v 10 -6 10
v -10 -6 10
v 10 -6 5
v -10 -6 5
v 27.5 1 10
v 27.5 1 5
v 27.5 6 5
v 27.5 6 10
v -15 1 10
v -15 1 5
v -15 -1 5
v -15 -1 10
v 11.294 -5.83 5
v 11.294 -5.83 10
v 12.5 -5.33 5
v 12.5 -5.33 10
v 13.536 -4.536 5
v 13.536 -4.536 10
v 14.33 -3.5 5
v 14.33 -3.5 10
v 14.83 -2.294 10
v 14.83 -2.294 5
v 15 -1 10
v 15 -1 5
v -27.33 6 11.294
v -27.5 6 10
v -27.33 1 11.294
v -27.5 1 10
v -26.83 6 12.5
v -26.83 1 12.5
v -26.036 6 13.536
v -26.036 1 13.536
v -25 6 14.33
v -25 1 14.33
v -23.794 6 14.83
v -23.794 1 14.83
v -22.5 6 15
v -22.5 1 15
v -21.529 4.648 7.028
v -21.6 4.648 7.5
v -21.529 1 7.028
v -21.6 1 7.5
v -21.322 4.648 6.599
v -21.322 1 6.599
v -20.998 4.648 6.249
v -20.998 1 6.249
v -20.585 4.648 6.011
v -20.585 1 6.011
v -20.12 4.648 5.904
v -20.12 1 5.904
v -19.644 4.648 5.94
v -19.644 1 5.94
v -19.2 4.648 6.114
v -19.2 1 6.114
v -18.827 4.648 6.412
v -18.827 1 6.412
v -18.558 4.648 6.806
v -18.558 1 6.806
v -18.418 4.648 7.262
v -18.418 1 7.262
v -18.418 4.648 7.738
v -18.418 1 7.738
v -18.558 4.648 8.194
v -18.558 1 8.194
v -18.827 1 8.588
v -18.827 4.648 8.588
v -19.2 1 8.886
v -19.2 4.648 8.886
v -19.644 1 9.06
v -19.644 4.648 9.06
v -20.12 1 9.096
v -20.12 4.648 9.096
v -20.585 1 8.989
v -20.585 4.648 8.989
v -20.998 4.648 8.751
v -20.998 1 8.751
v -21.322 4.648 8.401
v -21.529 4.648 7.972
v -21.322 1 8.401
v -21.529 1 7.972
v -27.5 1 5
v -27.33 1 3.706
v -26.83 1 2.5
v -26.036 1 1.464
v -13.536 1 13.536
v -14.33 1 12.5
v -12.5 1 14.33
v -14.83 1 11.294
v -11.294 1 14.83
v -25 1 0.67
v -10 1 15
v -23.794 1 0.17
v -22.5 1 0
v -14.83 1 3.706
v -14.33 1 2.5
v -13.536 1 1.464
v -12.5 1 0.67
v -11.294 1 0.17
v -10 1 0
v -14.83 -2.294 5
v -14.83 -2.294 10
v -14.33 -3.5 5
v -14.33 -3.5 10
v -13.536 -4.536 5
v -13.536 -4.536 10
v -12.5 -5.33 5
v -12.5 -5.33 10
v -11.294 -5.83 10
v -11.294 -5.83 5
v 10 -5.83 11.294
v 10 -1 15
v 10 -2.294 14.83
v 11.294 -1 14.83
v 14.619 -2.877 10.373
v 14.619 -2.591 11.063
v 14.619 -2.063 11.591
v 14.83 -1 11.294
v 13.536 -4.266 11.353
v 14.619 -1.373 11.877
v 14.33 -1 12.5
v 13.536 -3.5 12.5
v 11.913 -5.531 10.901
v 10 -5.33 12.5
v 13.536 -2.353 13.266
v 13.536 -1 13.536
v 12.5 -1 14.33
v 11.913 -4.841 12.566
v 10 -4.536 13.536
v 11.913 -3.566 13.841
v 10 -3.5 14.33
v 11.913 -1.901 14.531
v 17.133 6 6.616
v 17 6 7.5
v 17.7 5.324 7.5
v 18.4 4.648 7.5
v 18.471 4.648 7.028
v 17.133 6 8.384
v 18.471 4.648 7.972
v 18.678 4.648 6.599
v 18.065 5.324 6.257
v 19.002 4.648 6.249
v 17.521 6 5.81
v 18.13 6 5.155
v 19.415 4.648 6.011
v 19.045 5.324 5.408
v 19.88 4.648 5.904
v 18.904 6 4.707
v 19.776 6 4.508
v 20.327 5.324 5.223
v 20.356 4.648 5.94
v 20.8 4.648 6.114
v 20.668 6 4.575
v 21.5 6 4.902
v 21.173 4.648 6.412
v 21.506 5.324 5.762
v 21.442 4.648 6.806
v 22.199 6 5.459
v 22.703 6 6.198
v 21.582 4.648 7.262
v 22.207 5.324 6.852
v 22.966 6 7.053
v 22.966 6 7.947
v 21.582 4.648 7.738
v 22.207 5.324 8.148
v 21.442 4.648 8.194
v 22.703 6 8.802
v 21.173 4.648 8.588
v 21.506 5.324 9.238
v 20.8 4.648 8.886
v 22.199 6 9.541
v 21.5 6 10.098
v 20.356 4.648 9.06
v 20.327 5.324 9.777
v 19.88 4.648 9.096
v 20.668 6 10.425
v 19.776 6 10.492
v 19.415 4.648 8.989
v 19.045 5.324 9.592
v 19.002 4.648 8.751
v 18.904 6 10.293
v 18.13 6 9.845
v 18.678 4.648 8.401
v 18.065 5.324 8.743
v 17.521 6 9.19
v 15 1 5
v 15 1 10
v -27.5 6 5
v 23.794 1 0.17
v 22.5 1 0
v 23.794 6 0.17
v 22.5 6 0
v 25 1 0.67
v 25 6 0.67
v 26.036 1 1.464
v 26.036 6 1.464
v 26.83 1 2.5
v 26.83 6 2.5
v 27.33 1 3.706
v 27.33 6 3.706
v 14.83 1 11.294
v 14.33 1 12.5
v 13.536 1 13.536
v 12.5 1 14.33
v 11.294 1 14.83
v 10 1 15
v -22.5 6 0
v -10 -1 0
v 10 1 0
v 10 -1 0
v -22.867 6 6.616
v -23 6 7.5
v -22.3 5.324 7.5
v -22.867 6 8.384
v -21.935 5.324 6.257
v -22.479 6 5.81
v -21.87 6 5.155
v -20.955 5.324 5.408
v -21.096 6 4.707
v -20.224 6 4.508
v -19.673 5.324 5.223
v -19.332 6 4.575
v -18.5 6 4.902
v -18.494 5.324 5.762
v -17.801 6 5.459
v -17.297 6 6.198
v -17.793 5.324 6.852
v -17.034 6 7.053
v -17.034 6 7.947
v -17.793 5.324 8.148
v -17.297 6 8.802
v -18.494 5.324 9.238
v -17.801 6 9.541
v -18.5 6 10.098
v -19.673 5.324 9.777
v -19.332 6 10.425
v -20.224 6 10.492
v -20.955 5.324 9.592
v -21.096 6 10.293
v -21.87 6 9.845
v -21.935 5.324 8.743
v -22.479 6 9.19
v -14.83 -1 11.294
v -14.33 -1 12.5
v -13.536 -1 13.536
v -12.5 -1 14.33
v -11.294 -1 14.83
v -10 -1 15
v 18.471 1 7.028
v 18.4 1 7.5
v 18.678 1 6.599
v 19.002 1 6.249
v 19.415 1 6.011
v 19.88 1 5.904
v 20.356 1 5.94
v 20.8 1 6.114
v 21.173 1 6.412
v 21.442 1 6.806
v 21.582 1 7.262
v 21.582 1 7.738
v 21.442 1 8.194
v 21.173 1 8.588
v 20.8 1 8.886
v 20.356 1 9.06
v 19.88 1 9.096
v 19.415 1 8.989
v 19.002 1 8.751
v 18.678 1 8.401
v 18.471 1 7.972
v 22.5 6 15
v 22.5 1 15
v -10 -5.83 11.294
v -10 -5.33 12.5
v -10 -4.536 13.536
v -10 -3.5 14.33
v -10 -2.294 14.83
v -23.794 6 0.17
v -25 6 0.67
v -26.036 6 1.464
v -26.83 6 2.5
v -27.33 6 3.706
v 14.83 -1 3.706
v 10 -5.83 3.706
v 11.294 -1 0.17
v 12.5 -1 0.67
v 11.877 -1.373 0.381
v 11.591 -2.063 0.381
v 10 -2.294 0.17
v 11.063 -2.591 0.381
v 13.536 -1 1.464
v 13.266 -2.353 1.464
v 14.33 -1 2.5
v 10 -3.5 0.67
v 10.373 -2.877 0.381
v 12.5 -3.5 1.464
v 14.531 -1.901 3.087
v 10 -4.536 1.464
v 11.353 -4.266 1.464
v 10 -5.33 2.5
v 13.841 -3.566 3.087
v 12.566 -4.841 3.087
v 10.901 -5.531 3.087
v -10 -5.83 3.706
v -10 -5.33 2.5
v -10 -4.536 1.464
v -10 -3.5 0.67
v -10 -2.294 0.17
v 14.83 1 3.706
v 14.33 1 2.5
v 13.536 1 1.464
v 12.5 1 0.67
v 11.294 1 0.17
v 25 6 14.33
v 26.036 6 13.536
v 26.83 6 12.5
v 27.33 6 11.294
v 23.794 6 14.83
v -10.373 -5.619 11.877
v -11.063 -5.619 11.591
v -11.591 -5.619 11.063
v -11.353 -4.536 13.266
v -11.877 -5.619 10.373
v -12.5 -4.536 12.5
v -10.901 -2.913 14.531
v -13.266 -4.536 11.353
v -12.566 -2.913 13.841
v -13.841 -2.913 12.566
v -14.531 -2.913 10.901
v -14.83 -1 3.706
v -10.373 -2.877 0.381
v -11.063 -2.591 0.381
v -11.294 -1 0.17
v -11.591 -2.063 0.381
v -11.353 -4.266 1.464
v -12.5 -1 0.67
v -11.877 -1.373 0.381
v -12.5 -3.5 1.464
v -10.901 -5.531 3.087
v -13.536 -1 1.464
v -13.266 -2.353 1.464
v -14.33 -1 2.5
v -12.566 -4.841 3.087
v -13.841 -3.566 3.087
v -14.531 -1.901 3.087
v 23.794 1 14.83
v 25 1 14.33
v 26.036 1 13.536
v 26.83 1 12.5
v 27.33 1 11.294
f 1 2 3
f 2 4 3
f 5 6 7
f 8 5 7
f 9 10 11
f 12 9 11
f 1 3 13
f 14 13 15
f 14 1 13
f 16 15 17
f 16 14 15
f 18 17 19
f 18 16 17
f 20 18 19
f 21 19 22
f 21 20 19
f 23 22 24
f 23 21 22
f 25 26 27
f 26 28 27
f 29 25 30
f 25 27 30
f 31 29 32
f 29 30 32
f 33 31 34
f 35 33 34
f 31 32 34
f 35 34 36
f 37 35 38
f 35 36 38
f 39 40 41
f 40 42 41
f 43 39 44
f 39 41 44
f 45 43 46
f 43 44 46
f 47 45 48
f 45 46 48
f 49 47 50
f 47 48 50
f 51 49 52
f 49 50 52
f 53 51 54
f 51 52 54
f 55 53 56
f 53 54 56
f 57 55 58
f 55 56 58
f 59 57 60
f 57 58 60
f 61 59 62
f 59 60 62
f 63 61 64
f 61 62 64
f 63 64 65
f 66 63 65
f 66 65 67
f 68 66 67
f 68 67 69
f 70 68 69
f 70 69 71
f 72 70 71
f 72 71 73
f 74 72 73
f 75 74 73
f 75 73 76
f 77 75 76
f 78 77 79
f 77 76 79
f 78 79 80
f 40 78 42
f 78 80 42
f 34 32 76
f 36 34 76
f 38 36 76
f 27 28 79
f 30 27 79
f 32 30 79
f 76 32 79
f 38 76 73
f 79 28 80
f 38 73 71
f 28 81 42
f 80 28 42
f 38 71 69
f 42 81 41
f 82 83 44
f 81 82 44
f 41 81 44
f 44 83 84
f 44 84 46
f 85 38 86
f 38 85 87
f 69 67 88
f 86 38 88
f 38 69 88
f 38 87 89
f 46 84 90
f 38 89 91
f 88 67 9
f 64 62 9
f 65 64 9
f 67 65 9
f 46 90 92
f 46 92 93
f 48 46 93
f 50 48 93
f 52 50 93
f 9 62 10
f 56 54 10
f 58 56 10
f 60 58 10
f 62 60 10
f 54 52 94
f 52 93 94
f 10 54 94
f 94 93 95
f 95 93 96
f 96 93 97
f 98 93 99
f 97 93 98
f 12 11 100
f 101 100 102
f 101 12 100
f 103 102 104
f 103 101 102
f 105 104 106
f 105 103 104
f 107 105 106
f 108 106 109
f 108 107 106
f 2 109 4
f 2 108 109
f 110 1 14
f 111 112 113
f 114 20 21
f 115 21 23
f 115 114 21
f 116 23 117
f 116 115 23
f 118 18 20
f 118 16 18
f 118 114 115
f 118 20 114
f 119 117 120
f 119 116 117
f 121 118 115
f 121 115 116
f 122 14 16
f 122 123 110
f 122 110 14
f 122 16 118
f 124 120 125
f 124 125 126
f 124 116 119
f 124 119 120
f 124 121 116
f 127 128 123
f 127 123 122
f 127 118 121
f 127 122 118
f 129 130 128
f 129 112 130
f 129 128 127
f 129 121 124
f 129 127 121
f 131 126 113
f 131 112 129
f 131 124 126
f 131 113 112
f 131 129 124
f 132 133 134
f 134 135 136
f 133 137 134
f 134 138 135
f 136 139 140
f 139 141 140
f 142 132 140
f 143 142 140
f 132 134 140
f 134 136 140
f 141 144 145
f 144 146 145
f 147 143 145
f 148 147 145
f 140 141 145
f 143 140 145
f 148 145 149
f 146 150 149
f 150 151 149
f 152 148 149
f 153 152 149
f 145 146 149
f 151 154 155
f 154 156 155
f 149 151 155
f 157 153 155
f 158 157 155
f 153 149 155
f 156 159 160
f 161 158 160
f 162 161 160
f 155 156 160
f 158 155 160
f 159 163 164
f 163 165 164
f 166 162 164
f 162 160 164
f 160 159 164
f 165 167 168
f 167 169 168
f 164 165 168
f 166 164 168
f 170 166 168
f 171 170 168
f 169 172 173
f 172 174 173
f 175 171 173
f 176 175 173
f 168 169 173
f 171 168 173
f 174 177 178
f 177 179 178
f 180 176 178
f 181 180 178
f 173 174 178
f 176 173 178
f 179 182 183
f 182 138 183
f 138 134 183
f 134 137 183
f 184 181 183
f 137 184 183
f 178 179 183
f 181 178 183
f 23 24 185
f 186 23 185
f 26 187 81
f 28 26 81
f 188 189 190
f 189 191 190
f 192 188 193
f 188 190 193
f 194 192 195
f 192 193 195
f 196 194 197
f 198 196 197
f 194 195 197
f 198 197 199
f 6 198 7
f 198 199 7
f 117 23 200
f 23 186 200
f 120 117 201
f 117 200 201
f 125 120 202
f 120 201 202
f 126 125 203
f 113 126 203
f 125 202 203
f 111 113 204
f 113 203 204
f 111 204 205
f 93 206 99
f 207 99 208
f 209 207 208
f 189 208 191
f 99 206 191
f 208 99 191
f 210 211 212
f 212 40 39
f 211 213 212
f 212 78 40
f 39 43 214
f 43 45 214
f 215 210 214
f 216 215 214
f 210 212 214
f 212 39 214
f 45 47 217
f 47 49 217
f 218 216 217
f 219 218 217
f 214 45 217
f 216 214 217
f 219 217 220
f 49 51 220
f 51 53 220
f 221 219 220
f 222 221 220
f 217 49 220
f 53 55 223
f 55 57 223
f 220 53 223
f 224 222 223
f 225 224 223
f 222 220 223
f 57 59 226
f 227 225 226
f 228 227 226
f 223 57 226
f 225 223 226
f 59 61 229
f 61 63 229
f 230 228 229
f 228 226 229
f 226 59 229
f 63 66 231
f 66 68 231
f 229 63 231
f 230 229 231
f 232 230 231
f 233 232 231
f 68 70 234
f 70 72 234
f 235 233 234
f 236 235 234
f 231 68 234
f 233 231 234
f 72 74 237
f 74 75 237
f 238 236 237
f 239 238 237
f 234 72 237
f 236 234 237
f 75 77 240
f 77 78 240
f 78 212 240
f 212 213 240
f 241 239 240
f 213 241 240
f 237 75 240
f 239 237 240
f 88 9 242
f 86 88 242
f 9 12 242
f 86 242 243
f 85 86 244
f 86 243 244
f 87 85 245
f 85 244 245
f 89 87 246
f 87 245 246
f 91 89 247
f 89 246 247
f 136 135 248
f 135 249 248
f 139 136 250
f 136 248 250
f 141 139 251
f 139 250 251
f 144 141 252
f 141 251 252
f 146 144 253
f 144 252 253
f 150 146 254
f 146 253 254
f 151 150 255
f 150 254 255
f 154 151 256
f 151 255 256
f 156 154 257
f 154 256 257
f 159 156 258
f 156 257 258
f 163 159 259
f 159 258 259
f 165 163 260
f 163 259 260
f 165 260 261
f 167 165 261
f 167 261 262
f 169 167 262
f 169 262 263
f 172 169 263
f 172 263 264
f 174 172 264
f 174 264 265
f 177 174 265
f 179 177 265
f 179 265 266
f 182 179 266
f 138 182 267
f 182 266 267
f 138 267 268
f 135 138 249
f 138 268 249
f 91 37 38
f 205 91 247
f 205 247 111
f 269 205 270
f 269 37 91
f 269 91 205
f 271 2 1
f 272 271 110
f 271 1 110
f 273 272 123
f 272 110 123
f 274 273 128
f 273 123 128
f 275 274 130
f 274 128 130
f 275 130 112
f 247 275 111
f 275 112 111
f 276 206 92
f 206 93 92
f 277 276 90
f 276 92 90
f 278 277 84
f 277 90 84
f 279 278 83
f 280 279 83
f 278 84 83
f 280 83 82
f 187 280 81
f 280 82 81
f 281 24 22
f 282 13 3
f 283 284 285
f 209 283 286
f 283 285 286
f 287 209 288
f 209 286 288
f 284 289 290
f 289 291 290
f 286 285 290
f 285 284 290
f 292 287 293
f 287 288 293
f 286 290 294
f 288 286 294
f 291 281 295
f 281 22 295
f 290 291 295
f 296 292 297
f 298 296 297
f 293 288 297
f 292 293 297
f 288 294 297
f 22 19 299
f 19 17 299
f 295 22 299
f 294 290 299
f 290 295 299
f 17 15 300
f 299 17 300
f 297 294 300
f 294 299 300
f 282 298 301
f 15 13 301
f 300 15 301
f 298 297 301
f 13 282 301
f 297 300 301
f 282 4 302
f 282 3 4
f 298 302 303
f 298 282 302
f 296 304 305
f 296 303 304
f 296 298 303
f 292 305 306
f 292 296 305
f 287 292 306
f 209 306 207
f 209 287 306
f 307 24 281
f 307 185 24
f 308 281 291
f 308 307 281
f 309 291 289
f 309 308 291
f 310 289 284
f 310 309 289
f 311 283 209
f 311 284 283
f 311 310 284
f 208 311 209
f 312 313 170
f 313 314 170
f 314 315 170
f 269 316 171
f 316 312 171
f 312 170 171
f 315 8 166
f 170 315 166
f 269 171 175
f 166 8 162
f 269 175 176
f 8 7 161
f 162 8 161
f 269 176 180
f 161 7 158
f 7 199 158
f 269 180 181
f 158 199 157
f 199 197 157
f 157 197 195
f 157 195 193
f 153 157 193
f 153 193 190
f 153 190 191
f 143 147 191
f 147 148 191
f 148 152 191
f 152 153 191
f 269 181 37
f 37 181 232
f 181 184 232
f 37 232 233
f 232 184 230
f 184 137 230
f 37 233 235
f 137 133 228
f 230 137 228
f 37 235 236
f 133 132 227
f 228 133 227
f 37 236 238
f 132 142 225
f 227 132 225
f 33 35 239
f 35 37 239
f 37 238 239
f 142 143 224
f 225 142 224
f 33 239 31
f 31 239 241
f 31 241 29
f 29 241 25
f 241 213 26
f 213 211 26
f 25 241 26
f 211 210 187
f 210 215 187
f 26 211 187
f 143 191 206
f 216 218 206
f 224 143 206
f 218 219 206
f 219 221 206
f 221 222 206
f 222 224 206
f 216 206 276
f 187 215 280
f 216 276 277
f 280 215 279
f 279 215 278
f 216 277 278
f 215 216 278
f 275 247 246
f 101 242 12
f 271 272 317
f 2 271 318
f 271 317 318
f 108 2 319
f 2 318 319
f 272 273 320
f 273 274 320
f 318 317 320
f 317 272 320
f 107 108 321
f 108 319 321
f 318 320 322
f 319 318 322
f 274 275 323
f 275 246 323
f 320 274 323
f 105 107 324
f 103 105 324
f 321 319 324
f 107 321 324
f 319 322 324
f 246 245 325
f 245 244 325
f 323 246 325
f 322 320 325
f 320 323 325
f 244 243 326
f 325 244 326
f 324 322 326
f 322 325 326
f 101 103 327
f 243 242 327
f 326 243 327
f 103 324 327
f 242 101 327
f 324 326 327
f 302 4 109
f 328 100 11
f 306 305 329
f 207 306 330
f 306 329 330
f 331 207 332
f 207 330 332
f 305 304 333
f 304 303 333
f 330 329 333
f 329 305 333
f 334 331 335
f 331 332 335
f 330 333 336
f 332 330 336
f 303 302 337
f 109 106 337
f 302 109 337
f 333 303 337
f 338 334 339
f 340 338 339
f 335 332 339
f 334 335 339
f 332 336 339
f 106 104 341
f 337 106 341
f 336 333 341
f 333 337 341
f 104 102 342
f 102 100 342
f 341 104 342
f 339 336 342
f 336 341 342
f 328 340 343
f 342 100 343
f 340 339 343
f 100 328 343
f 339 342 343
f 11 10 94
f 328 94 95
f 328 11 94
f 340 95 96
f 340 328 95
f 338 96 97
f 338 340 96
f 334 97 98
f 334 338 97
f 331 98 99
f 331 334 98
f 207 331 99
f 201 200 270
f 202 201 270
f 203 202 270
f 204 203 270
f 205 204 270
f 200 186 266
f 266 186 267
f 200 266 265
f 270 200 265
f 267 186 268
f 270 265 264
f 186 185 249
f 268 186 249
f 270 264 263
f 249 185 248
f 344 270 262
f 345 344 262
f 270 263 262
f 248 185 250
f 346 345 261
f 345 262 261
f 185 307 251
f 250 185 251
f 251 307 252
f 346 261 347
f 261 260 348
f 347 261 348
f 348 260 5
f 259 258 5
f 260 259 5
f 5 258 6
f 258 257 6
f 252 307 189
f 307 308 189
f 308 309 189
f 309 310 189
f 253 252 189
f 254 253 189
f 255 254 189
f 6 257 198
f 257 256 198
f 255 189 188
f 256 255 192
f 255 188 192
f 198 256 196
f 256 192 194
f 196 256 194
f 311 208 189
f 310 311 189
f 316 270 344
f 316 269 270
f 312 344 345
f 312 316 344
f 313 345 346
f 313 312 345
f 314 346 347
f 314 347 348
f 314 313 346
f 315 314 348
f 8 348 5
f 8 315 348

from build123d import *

# Parameters (mm, degrees)
BOSS_EXTRU_1_DEPTH                                 = 15
FRAISAGE_POUR_VIS_T_TE_FRAIS_E_CRUCIFO_D           = 3.2
FRAISAGE_POUR_VIS_T_TE_FRAIS_E_CRUCIFO_CSINK_D     = 6
FRAISAGE_POUR_VIS_T_TE_FRAIS_E_CRUCIFO_CSINK_ANGLE = 92
CONG_2_R                                           = 5


with BuildPart() as part:
    # Esquisse1 → Boss.-Extru.1 (new body)
    with BuildSketch(Plane.XY):
        Polygon((27.5, 6), (-27.5, 6), (-27.5, 1), (-15, 1), (-15, -6), (15, -6), (15, 1), (27.5, 1), align=None)
    extrude(amount=BOSS_EXTRU_1_DEPTH)

    # Fraisage pour vis à tête fraisée cruciforme M31 (through all)
    with Locations(Plane(origin=(0, 6, 0), x_dir=(1, 0, 0), z_dir=(0, 1, 0))):
        with Locations((-20, -7.5), (20, -7.5)):
            CounterSinkHole(FRAISAGE_POUR_VIS_T_TE_FRAIS_E_CRUCIFO_D / 2, FRAISAGE_POUR_VIS_T_TE_FRAIS_E_CRUCIFO_CSINK_D / 2, counter_sink_angle=FRAISAGE_POUR_VIS_T_TE_FRAIS_E_CRUCIFO_CSINK_ANGLE)

    # Congé2
    cong_2_edges = [part.edges().sort_by_distance(p)[0] for p in [
        (-15, -2.5, 15),
        (-27.5, 3.5, 0),
        (0, -6, 15),
        (15, -6, 7.5),
        (-15, -6, 7.5),
        (15, -2.5, 15),
        (27.5, 3.5, 15),
        (-27.5, 3.5, 15),
        (27.5, 3.5, 0),
        (15, -2.5, 0),
        (0, -6, 0),
        (-15, -2.5, 0),
    ]]
    fillet(cong_2_edges, radius=CONG_2_R)


solid = part.part
